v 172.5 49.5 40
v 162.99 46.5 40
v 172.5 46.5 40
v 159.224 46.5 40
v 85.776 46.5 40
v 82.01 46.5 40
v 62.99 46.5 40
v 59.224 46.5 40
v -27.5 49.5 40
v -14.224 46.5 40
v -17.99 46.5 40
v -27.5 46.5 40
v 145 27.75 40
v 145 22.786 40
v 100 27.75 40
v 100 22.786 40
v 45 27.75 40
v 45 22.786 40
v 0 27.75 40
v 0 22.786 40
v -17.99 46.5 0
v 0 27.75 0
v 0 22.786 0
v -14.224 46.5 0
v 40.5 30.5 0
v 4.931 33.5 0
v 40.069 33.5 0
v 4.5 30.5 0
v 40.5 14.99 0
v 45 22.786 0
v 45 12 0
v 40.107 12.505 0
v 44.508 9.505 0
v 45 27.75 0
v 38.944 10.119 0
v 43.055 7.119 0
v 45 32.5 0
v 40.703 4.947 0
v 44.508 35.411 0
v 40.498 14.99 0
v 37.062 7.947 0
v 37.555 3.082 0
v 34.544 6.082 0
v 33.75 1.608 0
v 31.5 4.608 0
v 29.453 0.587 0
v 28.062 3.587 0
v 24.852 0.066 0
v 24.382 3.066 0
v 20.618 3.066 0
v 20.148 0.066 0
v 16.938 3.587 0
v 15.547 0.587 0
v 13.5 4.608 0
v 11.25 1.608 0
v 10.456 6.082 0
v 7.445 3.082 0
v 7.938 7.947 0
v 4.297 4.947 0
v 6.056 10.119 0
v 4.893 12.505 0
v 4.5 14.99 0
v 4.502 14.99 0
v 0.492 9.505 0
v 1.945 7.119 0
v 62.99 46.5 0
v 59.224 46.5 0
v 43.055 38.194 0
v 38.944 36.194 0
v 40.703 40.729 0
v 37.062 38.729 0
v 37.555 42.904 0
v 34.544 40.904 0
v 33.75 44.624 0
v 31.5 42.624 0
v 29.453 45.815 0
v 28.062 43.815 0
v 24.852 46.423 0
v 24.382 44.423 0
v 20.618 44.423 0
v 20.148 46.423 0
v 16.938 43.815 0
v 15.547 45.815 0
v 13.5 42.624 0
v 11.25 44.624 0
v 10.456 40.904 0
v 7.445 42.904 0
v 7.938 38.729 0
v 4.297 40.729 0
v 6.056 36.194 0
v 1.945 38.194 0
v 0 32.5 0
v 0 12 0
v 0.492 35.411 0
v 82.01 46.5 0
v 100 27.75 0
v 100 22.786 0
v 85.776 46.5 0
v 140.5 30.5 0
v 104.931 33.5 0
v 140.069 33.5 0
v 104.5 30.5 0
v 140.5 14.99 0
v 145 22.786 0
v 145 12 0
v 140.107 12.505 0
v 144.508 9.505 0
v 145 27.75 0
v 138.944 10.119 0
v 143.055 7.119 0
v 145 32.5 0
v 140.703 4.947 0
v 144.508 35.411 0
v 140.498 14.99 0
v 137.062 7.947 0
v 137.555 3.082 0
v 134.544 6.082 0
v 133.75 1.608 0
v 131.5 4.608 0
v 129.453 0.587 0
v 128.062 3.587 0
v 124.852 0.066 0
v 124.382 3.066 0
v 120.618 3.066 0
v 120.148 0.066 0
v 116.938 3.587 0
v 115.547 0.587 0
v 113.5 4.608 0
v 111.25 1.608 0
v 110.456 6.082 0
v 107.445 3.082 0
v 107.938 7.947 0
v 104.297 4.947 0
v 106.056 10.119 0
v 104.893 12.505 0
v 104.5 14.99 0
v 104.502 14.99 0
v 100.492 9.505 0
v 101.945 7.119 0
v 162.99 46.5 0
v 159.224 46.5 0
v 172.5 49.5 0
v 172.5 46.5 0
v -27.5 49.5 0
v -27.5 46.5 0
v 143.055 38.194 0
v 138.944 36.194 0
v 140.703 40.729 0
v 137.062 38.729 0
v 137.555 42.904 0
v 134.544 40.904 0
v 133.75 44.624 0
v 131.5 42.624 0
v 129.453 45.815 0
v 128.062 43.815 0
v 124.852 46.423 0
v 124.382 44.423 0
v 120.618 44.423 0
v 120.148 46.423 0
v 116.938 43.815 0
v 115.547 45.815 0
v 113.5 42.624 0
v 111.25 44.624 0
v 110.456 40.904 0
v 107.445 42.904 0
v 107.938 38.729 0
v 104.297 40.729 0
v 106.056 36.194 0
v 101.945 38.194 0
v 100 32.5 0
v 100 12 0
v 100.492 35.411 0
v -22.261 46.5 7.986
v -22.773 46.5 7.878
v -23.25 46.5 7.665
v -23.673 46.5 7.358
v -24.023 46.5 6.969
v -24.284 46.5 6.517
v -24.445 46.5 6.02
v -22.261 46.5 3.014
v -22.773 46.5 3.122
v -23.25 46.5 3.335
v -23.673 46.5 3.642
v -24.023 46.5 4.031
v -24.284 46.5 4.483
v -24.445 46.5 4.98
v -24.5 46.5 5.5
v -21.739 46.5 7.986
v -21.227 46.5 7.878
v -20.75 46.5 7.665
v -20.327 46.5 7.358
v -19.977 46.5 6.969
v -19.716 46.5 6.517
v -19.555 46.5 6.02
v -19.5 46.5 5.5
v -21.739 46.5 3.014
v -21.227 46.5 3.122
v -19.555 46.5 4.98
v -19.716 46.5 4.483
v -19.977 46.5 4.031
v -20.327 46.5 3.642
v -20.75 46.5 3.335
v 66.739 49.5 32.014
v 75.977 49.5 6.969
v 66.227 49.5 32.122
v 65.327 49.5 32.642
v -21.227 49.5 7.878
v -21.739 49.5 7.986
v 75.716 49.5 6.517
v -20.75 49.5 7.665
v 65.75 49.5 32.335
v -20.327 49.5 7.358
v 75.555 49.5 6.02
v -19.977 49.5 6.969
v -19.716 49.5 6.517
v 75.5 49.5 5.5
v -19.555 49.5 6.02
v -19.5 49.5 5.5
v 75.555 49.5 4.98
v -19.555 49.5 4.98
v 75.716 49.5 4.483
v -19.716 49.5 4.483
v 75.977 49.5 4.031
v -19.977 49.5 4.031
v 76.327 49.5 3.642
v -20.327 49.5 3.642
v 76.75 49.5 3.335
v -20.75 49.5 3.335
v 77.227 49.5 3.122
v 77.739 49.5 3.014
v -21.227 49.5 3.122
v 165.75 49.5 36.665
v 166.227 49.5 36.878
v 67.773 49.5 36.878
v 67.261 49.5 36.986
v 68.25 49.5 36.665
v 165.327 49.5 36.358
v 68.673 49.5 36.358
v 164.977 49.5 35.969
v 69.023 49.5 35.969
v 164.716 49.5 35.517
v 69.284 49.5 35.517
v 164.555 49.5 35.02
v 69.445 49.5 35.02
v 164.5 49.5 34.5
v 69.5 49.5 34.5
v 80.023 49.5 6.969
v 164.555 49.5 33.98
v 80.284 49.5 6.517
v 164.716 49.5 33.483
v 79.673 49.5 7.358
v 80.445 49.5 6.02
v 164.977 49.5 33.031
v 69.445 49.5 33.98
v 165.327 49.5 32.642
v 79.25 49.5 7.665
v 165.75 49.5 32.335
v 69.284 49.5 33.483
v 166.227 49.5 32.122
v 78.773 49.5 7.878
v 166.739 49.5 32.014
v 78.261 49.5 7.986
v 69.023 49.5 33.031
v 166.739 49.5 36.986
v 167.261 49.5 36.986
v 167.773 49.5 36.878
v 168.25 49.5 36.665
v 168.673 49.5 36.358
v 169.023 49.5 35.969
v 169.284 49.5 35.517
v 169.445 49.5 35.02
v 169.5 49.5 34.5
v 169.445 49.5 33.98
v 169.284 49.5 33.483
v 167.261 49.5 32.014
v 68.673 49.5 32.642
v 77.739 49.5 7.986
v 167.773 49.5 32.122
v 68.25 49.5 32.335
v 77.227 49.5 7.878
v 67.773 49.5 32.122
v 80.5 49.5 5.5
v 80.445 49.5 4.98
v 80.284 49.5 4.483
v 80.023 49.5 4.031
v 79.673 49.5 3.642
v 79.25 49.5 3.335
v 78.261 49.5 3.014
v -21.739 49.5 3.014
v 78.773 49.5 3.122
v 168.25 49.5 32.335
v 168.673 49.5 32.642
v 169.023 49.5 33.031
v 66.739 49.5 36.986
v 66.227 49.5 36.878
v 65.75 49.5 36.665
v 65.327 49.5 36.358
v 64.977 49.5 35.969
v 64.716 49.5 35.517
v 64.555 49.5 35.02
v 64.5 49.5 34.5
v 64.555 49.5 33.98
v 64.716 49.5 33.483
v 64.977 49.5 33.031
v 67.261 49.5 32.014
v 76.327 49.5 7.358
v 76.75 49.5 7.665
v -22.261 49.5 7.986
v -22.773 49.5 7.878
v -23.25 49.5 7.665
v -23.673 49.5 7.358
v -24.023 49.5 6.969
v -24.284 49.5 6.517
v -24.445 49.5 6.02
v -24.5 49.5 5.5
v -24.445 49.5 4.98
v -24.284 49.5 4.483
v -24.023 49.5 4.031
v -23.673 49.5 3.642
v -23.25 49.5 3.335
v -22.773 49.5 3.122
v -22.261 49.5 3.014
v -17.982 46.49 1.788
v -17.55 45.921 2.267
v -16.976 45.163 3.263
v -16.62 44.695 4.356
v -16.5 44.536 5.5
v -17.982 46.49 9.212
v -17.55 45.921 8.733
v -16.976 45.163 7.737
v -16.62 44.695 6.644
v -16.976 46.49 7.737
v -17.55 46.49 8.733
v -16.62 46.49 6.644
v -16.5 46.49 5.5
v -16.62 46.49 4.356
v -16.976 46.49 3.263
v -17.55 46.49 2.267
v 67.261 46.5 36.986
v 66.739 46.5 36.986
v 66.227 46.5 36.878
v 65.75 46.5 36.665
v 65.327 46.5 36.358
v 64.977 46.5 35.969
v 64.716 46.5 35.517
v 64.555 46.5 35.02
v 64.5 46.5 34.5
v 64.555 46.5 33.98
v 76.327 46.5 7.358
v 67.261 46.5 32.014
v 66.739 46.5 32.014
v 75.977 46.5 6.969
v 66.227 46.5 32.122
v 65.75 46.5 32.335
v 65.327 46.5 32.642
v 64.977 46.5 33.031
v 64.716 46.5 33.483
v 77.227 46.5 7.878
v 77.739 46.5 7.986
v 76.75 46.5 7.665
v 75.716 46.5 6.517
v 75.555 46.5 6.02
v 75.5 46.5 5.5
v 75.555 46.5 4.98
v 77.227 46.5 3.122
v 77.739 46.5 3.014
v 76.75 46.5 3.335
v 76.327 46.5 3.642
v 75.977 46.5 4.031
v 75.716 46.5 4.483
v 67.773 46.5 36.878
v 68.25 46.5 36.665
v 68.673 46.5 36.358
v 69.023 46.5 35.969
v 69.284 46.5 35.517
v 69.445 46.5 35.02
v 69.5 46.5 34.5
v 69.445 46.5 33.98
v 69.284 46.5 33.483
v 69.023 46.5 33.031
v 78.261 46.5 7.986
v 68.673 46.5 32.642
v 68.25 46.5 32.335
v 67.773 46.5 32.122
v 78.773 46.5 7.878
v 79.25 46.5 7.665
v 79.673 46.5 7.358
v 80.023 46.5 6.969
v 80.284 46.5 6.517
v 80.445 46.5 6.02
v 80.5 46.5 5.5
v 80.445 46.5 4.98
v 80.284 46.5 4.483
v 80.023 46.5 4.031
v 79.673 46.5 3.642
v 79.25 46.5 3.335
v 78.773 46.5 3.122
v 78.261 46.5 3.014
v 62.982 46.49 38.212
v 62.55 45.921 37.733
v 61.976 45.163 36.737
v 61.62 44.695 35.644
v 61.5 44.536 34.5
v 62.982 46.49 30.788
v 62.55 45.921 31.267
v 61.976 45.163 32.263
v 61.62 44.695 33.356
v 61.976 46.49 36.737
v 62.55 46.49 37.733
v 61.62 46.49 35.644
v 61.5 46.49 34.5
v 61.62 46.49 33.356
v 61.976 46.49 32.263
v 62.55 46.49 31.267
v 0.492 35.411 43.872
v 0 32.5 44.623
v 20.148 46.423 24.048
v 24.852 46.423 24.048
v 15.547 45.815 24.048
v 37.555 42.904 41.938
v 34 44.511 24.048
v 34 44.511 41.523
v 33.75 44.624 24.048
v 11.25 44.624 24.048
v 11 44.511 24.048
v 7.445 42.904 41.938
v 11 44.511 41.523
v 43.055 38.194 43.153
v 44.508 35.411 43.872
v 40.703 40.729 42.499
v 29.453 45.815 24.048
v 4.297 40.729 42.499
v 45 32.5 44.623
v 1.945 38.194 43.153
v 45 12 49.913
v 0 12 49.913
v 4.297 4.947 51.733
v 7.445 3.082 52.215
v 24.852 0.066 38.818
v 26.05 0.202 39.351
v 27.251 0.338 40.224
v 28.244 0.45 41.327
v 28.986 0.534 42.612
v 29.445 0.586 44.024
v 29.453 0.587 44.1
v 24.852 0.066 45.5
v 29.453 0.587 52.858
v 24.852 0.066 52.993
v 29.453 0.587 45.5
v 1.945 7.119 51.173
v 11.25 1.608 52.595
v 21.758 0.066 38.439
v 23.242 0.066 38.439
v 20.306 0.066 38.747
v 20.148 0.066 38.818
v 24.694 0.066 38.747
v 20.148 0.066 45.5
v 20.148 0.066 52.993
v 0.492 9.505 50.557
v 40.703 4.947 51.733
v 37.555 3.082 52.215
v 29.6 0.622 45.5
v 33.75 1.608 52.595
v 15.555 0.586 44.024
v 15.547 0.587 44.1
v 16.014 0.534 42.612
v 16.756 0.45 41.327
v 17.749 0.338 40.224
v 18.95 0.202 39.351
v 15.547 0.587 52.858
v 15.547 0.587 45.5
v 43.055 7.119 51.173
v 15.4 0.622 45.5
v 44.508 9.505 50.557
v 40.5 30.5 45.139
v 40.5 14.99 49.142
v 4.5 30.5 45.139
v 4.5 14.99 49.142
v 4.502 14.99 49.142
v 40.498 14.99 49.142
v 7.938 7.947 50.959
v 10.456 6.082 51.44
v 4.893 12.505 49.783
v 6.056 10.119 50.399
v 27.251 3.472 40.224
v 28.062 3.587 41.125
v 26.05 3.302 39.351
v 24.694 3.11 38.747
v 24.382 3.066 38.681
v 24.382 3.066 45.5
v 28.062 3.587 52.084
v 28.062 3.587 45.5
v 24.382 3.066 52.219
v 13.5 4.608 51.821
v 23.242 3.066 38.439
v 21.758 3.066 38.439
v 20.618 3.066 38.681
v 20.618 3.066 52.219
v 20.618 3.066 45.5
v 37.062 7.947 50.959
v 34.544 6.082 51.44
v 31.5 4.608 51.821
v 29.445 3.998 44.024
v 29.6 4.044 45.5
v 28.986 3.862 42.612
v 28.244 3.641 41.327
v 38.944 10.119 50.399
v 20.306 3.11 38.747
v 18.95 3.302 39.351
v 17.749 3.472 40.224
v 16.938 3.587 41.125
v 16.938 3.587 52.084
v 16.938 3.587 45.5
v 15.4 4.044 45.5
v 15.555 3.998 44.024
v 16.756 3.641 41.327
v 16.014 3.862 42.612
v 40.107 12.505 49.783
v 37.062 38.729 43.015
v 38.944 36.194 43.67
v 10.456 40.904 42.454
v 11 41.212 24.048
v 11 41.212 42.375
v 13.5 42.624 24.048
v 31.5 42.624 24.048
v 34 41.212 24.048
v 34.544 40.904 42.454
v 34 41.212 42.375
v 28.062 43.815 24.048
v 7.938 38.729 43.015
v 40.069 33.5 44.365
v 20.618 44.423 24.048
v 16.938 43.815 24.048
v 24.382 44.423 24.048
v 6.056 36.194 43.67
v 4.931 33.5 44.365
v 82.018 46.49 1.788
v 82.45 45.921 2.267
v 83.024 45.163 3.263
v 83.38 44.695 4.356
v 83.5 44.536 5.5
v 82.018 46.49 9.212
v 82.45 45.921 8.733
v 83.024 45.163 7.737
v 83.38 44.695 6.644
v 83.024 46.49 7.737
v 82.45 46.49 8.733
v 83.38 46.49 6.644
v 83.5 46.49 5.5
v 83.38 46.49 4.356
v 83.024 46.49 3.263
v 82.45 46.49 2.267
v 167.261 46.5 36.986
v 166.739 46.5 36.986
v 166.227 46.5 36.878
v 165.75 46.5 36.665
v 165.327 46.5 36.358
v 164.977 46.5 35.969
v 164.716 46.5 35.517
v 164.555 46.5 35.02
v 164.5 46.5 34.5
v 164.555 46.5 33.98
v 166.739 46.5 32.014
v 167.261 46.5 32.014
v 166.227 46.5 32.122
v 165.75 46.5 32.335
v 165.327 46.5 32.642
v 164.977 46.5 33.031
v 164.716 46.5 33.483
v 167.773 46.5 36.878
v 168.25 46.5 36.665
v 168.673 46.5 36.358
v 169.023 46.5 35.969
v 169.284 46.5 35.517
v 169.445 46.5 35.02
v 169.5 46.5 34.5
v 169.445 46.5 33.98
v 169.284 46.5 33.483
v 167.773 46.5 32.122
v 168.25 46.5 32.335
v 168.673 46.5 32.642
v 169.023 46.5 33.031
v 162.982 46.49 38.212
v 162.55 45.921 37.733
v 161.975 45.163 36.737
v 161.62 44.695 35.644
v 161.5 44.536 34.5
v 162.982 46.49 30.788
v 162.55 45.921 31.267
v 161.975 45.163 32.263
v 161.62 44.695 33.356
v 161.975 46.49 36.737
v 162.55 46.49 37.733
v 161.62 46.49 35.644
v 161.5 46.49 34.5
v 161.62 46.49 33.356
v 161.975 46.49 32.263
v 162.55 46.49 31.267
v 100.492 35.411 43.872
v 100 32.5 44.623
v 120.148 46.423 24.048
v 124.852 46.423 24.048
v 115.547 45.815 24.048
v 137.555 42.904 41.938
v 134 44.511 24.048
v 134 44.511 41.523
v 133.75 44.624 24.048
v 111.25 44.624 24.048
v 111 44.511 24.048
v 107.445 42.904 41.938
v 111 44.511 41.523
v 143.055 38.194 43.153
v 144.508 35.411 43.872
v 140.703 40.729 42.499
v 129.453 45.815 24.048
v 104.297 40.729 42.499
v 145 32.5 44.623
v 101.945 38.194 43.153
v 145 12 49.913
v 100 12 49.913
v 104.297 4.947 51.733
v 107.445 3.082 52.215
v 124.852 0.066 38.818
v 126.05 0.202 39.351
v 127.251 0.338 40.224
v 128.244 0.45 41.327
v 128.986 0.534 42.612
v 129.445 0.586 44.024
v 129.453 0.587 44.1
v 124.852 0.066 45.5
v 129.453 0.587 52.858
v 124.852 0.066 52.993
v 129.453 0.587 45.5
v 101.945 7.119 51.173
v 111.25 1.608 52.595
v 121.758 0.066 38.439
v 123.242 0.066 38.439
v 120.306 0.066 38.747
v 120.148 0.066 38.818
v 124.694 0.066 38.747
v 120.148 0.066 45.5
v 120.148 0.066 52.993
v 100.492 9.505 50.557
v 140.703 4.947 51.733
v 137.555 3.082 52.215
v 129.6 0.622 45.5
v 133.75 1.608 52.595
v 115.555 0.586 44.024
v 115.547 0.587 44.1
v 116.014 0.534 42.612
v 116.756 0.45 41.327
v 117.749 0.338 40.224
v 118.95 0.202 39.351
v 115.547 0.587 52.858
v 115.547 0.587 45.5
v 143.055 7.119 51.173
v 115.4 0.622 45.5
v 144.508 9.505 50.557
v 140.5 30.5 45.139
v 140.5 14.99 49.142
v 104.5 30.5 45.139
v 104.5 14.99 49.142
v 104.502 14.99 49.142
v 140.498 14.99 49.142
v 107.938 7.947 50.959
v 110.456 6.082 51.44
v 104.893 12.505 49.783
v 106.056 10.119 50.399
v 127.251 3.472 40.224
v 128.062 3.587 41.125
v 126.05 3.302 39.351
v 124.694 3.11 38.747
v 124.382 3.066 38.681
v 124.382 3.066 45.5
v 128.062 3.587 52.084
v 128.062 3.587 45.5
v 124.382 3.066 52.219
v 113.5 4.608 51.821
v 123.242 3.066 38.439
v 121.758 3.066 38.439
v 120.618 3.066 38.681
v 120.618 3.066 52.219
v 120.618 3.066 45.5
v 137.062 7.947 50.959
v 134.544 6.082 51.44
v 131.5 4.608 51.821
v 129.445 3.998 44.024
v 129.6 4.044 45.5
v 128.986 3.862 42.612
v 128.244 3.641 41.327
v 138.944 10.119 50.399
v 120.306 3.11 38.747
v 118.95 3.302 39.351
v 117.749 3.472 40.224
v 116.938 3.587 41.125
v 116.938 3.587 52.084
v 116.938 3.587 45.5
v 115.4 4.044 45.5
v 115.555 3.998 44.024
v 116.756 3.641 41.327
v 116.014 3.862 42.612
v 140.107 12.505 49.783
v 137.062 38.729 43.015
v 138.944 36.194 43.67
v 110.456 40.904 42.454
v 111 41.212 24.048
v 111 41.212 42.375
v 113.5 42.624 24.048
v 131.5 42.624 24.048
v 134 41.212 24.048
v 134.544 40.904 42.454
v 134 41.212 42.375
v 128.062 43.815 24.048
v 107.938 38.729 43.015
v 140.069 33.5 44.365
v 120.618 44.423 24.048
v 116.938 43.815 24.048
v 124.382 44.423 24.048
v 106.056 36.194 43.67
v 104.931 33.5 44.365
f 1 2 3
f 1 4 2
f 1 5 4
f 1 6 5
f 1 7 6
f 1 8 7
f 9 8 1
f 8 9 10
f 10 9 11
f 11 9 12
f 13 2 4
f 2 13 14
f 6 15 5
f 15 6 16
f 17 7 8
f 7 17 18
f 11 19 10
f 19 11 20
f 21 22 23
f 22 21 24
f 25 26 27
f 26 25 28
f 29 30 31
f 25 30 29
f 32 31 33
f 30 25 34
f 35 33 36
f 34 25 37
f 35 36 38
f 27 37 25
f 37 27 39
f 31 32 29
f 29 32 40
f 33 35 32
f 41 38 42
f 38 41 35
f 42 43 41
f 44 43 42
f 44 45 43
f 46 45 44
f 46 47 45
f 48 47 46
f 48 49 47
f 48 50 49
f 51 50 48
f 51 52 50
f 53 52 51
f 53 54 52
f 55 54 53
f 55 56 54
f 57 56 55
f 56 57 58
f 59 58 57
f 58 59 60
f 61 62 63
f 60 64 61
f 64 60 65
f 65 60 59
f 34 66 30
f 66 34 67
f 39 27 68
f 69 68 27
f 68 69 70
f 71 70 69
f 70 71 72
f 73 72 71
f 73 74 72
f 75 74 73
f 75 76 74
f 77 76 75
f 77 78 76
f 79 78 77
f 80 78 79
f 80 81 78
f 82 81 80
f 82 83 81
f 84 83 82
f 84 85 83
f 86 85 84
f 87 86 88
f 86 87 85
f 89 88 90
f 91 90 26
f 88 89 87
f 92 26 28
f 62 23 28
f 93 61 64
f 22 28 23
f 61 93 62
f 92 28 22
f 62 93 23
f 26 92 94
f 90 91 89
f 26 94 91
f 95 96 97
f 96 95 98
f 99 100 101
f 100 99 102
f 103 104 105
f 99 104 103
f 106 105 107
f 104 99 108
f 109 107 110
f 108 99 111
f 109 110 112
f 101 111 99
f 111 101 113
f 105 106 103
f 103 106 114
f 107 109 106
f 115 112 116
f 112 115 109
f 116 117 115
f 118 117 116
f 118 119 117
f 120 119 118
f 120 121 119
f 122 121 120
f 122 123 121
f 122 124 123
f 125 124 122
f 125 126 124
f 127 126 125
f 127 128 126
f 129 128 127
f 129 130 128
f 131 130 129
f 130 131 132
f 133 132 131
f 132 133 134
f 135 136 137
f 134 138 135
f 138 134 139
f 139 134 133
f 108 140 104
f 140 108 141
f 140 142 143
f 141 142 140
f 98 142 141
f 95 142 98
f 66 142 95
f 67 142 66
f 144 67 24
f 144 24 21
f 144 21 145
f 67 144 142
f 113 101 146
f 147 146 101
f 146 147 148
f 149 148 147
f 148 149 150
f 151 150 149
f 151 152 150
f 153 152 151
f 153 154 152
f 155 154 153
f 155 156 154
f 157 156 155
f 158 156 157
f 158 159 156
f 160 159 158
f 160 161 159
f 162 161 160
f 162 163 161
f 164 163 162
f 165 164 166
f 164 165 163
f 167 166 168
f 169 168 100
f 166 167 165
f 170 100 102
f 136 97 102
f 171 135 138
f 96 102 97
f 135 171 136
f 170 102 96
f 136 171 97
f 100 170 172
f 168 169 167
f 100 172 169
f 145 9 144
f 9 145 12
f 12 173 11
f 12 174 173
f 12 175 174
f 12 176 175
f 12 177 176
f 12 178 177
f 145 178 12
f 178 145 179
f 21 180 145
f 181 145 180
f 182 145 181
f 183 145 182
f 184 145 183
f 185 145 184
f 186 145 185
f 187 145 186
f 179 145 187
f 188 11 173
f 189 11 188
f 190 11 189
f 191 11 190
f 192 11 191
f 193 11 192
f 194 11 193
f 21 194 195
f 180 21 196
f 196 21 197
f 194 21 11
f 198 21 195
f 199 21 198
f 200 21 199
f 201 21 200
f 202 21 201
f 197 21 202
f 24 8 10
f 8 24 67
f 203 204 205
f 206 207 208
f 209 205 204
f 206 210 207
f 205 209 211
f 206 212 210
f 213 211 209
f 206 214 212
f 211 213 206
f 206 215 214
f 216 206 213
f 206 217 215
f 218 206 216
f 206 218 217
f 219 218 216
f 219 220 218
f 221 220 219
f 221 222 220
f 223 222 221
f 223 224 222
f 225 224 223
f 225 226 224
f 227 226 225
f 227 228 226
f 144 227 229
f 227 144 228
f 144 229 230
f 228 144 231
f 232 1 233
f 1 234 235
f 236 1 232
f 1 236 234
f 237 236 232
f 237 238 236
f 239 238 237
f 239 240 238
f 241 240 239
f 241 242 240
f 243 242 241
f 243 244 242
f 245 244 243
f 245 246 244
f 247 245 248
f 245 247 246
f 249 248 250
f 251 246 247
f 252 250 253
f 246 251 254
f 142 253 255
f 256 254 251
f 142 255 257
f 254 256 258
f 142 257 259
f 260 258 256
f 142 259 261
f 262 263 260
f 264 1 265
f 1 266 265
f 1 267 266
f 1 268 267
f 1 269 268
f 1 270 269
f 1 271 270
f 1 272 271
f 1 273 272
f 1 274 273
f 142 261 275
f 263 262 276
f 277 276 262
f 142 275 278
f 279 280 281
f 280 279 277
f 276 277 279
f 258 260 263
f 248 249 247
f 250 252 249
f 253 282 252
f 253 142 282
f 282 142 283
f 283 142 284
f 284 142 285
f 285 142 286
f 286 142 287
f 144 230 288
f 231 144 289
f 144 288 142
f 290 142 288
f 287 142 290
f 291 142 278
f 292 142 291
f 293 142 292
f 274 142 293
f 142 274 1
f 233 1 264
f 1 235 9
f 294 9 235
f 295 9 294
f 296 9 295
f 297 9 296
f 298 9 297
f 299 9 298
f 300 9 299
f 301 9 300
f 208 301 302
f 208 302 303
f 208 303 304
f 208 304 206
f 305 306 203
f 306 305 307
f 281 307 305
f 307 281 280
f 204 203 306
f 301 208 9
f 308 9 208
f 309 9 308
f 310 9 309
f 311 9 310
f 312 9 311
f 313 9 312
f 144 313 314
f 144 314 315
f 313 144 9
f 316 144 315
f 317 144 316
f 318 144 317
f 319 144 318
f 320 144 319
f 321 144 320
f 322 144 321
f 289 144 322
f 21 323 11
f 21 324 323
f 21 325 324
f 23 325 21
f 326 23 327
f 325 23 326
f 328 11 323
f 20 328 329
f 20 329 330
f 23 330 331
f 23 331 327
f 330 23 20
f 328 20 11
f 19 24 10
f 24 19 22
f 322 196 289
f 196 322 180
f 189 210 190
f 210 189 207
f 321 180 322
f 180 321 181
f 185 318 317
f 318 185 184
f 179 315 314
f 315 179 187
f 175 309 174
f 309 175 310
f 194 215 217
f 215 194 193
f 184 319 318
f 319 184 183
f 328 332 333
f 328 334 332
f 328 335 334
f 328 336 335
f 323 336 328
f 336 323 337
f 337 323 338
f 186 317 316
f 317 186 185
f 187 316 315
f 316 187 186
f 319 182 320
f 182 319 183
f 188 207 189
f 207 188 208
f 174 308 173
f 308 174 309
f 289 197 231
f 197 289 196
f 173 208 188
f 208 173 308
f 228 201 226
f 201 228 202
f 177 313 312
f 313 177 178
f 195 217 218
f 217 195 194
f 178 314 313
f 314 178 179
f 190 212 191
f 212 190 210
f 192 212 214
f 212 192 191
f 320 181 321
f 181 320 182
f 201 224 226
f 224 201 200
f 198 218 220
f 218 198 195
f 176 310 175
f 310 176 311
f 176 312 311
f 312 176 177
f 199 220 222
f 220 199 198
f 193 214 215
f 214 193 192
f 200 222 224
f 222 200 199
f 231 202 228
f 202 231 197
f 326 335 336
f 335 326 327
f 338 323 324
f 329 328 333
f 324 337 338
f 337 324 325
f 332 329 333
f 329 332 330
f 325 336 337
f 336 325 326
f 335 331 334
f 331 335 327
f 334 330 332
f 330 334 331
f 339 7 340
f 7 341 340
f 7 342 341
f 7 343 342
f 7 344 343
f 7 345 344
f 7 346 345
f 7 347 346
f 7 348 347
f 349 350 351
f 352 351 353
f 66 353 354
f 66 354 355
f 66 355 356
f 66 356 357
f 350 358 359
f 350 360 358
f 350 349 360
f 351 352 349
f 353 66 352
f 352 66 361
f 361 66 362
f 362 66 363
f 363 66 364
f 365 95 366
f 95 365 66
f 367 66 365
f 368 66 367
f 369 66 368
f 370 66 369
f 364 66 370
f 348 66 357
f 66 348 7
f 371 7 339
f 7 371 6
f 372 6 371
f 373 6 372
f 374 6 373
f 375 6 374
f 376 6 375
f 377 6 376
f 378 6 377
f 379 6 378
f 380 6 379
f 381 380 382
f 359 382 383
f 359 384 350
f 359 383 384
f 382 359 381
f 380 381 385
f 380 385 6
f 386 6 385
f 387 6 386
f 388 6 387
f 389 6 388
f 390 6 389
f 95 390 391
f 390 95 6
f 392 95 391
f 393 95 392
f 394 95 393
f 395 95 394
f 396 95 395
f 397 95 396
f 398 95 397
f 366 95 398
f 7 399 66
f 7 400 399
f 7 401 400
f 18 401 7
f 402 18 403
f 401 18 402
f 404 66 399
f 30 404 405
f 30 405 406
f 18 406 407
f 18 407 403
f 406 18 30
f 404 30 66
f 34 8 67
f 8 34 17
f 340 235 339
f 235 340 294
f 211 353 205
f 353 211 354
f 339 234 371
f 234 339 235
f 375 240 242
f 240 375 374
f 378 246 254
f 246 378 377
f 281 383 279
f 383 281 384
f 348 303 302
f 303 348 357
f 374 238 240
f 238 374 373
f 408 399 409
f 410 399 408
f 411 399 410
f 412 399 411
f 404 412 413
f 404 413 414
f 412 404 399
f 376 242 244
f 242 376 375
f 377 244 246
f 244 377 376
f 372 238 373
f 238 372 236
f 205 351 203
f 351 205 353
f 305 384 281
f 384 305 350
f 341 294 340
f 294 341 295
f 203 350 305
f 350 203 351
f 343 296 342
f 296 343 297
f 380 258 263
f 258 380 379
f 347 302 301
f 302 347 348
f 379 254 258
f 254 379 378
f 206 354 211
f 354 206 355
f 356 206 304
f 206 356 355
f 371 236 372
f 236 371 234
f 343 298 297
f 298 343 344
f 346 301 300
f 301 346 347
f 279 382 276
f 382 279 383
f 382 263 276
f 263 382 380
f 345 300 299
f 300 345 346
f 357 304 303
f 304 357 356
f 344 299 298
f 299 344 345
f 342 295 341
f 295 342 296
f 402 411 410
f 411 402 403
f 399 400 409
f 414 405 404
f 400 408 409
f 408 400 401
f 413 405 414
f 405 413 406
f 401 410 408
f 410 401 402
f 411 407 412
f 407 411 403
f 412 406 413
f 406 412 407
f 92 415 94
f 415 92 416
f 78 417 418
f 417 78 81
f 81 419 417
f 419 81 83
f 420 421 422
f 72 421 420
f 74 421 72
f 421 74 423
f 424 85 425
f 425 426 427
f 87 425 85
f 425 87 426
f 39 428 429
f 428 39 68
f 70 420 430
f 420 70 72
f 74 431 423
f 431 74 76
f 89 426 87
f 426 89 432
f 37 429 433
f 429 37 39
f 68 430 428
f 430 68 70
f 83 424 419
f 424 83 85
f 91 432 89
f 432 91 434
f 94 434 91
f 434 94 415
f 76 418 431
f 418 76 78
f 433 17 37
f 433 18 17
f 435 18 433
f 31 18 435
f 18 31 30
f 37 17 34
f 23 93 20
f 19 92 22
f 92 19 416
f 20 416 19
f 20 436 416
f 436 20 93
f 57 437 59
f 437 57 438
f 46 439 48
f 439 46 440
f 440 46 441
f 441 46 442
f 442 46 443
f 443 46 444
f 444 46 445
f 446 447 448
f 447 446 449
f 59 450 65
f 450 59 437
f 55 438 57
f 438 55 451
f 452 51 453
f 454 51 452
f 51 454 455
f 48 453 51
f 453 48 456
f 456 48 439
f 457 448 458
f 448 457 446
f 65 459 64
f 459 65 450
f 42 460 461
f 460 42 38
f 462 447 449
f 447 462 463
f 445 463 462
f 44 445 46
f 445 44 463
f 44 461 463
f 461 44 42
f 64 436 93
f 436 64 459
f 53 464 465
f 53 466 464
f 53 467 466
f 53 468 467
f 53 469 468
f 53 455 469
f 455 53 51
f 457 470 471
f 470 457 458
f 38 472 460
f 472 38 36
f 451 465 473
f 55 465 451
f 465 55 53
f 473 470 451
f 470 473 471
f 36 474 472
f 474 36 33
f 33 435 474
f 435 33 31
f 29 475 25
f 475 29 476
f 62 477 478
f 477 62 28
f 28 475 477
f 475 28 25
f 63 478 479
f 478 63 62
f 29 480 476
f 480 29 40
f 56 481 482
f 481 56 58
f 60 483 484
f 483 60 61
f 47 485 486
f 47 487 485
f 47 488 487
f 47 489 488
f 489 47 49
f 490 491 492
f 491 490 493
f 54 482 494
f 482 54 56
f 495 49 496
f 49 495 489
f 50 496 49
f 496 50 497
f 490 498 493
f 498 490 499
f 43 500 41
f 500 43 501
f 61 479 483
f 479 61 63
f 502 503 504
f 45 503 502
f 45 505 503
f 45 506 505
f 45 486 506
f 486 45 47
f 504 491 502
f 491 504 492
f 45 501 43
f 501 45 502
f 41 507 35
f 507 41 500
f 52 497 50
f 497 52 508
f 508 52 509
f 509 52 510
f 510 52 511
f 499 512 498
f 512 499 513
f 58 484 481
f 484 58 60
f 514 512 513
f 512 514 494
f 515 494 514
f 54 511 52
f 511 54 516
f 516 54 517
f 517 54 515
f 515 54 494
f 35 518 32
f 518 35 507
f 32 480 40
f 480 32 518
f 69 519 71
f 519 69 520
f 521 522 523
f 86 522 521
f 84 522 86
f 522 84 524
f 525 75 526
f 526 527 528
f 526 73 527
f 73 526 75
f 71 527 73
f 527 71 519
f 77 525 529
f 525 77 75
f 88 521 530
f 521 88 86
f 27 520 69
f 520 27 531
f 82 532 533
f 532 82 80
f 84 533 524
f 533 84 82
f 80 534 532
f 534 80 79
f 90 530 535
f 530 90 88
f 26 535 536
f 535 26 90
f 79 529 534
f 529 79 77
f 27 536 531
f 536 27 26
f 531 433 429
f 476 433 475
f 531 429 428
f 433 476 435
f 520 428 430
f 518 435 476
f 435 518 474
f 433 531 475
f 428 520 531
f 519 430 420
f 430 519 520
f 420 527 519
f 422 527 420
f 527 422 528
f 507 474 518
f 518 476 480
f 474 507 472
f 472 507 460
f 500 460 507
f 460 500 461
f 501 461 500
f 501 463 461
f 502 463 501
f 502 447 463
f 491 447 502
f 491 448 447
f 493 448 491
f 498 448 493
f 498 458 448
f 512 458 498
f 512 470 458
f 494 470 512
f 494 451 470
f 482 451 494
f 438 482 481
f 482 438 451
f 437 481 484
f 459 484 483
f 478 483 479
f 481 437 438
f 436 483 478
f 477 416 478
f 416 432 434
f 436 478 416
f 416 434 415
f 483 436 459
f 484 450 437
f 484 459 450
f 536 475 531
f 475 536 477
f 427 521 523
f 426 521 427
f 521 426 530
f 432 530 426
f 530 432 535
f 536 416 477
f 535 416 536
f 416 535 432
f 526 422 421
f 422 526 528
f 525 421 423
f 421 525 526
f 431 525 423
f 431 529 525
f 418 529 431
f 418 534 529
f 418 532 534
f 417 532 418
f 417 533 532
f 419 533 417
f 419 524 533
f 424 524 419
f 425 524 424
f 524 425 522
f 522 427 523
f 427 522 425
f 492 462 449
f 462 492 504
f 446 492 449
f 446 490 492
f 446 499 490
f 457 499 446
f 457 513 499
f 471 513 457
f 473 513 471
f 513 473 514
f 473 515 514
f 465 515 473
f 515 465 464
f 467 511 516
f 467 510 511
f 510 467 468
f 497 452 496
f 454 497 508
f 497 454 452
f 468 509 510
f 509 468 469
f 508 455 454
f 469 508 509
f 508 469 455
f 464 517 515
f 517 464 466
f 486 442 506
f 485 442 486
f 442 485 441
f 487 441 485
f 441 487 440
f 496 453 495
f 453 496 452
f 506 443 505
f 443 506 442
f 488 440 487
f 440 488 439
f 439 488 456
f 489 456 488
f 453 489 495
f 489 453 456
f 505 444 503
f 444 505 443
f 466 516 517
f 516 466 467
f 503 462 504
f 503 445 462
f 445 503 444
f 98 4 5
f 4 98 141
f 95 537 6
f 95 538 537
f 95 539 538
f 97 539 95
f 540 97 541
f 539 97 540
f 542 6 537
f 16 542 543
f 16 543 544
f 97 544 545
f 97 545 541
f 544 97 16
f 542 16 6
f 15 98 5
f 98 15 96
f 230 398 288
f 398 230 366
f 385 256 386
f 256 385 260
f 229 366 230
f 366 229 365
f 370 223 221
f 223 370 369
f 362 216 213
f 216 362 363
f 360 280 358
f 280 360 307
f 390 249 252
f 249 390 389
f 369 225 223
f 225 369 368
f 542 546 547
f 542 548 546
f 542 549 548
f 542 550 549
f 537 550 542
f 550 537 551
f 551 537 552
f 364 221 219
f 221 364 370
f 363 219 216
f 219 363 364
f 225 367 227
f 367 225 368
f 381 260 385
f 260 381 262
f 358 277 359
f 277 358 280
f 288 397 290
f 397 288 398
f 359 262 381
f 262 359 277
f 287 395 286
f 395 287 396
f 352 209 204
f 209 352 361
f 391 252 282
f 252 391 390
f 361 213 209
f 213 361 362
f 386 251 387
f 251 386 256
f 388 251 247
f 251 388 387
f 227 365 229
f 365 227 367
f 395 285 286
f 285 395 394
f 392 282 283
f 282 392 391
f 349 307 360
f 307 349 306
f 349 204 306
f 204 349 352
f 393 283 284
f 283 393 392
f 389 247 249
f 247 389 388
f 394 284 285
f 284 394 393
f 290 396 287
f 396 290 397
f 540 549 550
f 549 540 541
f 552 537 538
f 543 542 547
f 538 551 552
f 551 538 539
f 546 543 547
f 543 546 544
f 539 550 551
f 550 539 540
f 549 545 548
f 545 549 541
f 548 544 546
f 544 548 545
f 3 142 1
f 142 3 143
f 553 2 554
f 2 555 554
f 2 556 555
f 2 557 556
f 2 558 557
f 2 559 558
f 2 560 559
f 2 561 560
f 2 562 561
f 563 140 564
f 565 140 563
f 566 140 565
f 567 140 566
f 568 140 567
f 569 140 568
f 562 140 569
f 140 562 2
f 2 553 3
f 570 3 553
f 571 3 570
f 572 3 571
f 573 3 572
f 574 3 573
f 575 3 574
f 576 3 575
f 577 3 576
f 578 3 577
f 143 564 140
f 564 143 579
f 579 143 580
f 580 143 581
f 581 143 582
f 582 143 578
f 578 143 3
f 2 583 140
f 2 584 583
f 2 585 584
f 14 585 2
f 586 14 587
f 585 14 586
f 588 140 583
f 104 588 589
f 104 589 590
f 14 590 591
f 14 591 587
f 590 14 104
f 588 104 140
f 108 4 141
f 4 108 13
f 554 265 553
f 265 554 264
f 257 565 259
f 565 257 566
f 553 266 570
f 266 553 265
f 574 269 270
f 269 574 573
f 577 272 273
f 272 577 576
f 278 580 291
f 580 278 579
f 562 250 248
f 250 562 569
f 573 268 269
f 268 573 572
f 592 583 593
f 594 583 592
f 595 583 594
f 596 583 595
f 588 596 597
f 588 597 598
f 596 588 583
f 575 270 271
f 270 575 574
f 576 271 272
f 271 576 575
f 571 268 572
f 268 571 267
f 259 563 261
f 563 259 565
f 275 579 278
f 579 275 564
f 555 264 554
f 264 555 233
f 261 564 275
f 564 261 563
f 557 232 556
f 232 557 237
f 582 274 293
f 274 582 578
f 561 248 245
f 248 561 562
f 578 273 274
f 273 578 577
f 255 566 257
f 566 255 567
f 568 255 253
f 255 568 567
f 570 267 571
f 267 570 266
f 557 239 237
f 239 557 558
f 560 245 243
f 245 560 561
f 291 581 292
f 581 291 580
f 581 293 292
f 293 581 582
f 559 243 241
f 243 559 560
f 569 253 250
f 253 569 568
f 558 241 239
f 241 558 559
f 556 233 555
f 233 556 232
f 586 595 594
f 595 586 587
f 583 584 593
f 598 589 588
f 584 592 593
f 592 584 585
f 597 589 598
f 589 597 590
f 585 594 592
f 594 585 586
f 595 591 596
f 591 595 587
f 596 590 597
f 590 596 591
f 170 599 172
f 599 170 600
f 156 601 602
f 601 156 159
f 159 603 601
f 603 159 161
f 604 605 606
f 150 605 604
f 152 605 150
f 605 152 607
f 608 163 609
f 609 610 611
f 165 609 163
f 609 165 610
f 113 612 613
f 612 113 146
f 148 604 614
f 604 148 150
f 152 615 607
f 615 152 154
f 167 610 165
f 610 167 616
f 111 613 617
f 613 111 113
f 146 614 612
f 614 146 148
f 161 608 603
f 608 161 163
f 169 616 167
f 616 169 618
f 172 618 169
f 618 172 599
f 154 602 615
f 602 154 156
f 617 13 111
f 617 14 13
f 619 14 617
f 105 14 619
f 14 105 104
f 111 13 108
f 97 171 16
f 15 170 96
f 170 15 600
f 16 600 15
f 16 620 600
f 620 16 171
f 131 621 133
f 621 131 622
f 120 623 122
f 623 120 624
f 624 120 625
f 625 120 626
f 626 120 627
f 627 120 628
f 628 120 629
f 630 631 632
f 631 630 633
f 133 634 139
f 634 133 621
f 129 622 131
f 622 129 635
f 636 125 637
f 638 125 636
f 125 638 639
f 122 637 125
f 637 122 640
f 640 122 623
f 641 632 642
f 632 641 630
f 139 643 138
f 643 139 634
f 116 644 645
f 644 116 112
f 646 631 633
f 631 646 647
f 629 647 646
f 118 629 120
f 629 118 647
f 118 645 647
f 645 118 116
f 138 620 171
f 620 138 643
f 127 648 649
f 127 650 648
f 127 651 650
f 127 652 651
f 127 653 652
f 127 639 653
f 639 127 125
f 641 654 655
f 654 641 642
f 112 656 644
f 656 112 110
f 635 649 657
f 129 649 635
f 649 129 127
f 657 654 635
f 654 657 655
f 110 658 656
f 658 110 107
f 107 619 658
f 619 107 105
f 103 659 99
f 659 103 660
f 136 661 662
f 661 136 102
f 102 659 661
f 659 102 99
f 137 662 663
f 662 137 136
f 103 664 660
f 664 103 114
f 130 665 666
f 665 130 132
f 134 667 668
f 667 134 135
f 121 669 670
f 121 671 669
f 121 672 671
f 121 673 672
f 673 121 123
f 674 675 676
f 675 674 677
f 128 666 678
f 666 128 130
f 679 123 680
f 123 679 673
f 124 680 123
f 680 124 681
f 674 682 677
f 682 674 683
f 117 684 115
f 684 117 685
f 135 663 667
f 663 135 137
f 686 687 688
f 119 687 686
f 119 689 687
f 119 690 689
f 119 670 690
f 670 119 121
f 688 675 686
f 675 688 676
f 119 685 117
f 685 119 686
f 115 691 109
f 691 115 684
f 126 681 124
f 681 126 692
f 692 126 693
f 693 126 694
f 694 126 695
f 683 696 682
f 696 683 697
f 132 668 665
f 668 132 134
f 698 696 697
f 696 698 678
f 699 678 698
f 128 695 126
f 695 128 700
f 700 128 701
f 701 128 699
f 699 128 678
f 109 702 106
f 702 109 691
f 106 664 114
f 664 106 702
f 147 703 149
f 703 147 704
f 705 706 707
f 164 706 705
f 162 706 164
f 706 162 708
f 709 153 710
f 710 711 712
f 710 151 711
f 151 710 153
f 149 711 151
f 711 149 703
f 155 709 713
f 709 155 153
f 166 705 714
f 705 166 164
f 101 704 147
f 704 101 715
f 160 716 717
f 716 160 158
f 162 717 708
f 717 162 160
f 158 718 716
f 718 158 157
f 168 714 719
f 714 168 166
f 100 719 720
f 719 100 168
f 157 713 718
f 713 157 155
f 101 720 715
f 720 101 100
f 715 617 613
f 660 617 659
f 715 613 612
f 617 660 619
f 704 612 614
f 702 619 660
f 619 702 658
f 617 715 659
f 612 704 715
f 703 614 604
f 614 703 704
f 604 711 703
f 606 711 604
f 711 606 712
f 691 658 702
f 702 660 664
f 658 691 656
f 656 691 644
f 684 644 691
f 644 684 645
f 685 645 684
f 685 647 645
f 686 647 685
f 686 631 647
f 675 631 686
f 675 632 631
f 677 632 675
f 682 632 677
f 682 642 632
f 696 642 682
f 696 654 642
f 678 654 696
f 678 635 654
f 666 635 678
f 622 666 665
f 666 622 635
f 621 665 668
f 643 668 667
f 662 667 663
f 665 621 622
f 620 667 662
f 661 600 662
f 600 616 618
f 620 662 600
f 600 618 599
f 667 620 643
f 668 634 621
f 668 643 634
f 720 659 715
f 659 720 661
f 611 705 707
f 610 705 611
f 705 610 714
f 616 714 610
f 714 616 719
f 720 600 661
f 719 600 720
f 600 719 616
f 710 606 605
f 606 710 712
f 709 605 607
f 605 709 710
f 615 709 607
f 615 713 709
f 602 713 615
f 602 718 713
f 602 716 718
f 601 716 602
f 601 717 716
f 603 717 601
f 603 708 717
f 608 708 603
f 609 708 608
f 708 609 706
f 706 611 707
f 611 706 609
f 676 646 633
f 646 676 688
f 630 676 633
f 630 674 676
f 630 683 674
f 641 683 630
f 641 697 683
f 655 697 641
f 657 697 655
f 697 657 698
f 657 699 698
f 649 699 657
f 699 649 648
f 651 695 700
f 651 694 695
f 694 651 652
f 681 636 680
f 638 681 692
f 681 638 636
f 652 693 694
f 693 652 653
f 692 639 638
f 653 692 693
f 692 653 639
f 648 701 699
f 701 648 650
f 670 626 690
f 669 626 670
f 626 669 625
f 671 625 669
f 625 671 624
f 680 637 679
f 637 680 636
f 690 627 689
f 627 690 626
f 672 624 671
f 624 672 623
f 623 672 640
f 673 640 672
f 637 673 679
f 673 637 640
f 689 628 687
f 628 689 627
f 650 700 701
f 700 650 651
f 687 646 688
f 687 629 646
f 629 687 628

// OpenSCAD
// The number of accessory holders to produce
numAccessoryHolders = 2; // [1:10]

// The depth of the cavity which contains the accessory. 53mm is just enough to fully contain the nozzle on my accessories.
holderDepth = 53; // [15:60]

// The center-to-center distance between accessory holders, in mm. 135mm is about right for a floor roller.
accessoryHolderSpacing = 100; //[75:200]

// The height of the structure between the accessory holders
wallPlateHeight = 40; // [10:53]

// The size of the screw holes, in mm. Be sure to include necessary clearance. 5mm corresponds to roughly a #10 SAE screw. Set to zero for no screw holes.
screwHoleDiameter = 5; // [0:10]

// Screw head size, in mm. Set this to the size of the screws you plan to use for mounting. Zero for no screw head clearance.
screwHeadDiameter = 11; // [0:50]

/* [Hidden] */

// Measured Constants. May be useful to change these to make accessory holders for slightly-different vacuums.
// I am defining the nozzle as the part of the accessory which goes into the vacuum, and the shell as the part of the accessory which is outside of the vacuum (the clip is on the shell).
// All units in millimeters.

// The longer measurement of the accessory nozzle, perpendicular to the acuation direction of the clip.
nozzleLongDimension = 36.0;

// The shorter measurement of the accessory nozzle, parallel to the actuation direction of the clip.
nozzleShortDimension = 27.5;

// The measurement of the shell in the same axis as the nozzleLongDimension.
shellOutsideLongDimension = 45.0;

// The measurement of the shell in the same axis as the nozzleShortDimension.
shellOutsideShortDimension = 46.5;

// The size of the "clippy" part of the clip, same axis as nozzleLongDimension.
clipInnerWidth = 14.2;

// The height of the "clippy" part of the clip, parallel to the long axis of the accessory.
clipInnerHeight = 5.0;

// The clearance needed for the clip to swing. Same axis as the nozzleShortDimension.
clipThickness = 9.0;

// The height of the clip from the shell. There should be a cutout starting here.
clipHeight = 7.5;

// The distance between the nozzle and the outer shell, measured at the point of the clip. The clip would clip in here.
nozzleShellClipDistance = 3;

// The distance between the nozzle and the outer shell, measured on the opposite size from the clip.
nozzleShellRearDistance = 17.0;

// The shell runs at an angle, with the lowest part at the clip and the highest part opposite the clip. This is the change in height between the shell at the clip, and the shell at opposite side.
shellRearHeightLoss = 12.0;

// The rear shell footprint is roughly an oval with the long diameter of shellOutsideLongDimension and the short radius of this value.
// Controls the round-ness of the rear of the accessory holder.
shellRearShortRadius = 14.0;

// The front shell footprint is roughly an oval with the long diameter of shellOutsideLongDimension and the short radius of this value.
// Controls the round-ness of the front of the accessory holder.
shellFrontShortRadius = 12.0;

// Some accessories, like the floor rollers, have a plug to carry power from the vacuum to the acessory. Make space for that.
powerPlugLength = 23.0;
powerPlugWidth = 10.0;
powerPlugHeight = 18.5;

// Constants

// Epsilon, used as a fudge factor when making floating point comparisons, such as in union and difference functions.
eps = 0.01;

// Whenever we produce a shell which just needs to look pretty, it should be this thick.
cosmeticShellThickness = 2.0;

// Whenever we produce a shell which actually needs to do something, it should be this thick.
structuralShellThickness = 3.0;

// Make a partial circle of the given height. Scale the result to fit your needs.
// @param a: Angle in degrees
// @param r: Cylinder radius
// @param h: Cylinder height
// @return A semi-cylinder of height h and radius r
module cylinderSlice(r, h, a){
  scale([r, r, h])
  scale([1/100, 1/100, 1]) // Make the original radius 100, then scale back to 1, to get a reasonable number of faces since scad represents circles as polygons.
  rotate_extrude(angle=a) square([100,1]);
}

// Make a single accessory holder
module makeAccessoryHolder() {
    // Create the main body of the accessory holder
    difference() {
         // Outer shell
        union() {
          // Rear rounding
          translate([
            shellOutsideLongDimension / 2,
            shellOutsideShortDimension - shellRearShortRadius,
            0
          ])
          scale([shellOutsideLongDimension / 2, shellRearShortRadius, holderDepth])
          cylinderSlice(r=1, h=1, a=180);
          // Squared middle
          translate([0, shellFrontShortRadius, 0])
          cube([shellOutsideLongDimension, shellOutsideShortDimension - shellRearShortRadius - shellFrontShortRadius, holderDepth]);
          // Front rounding
          translate([shellOutsideLongDimension / 2, shellFrontShortRadius, 0])
          rotate(180, [0, 0, 1])
          scale([shellOutsideLongDimension / 2, shellFrontShortRadius, holderDepth])
          cylinderSlice(r=1, h=1, a=180);
        }

        // Cutout for the accessory nozzle
        translate([
          (shellOutsideLongDimension - nozzleLongDimension)/2, nozzleShellClipDistance, -eps
        ])
        union() {
          translate([0, shellFrontShortRadius - eps, 0])
          cube([nozzleLongDimension, nozzleShortDimension- shellFrontShortRadius + eps, holderDepth + 2*eps]);
          translate([
            nozzleLongDimension / 2,
            shellFrontShortRadius,
            -eps
          ])
          rotate(180, [0, 0, 1])
          scale([nozzleLongDimension / 2, shellFrontShortRadius, holderDepth + 2*eps])
          cylinderSlice(r=1, h=1, a=180);
        }

        // Cut off the top at an angle
        // Use an absurdly tall cube, rotated to the appropriate angle, to make this cut.
        cutAngle = atan(shellRearHeightLoss/shellOutsideShortDimension);
        translate([
          -eps,
          0,
          holderDepth + eps
        ])
        rotate(-1 * cutAngle, [1, 0, 0])
        cube([
          shellOutsideLongDimension * 2,
          shellOutsideShortDimension * 2,
          holderDepth * 2
        ]);

        // Cutout the back area, so as not to waste materials when printing
        translate([
          (shellOutsideLongDimension - nozzleLongDimension)/2,
          nozzleShellClipDistance + nozzleShortDimension + structuralShellThickness,
          -eps
        ])
        difference() {
          // Trim the part which will be used to make the cutout, to make sure the structural shell part is not removed
          union() {
            // Join a semi-cylinder with a cube to make the cutout
            wasteSize = shellOutsideShortDimension - nozzleShellClipDistance - nozzleShortDimension - cosmeticShellThickness - structuralShellThickness;
            translate([
              nozzleLongDimension / 2,
              wasteSize - shellRearShortRadius,
              0
            ])
            scale([nozzleLongDimension / 2, shellRearShortRadius, 1])
            cylinderSlice(r=1, h=holderDepth + 2*eps, a=180);

            cube([
              nozzleLongDimension,
              wasteSize - shellRearShortRadius + eps,
              holderDepth + 2*eps
            ]);
          }

          translate([0, -structuralShellThickness, 0])
          cube([nozzleLongDimension, structuralShellThickness, holderDepth]);
        }

        // Cutout for the power plug
        translate([
          shellOutsideLongDimension/2 - powerPlugLength / 2,
          shellOutsideShortDimension - powerPlugWidth + eps,
          holderDepth - shellRearHeightLoss - powerPlugHeight + structuralShellThickness * 2 * tan(cutAngle)
        ])
        cube([powerPlugLength, powerPlugWidth, powerPlugHeight]);

        // Cutout for the clip
        translate([
          (shellOutsideLongDimension)/2,
          nozzleShellClipDistance + shellFrontShortRadius + 2*eps,
          holderDepth - clipHeight
        ])
        rotate([90, 180, 0])
        difference() {
          cylinderSlice(r=clipInnerWidth/2, h=nozzleShellClipDistance + shellFrontShortRadius + 2*eps, a=180);
        }
    }
}

module makeWallPlate() {
  difference() {
    union() {
      wallPlateSize = accessoryHolderSpacing/2;
      // The main, back part of the wall plate
      cube([wallPlateSize + eps, structuralShellThickness, wallPlateHeight]);

      // Pick the angle such that the brace will meet the center of the accessory holder and leave enough space for a screw.
      wallDistanceToBrace = wallPlateSize - (shellOutsideLongDimension / 2) - screwHeadDiameter;
      heightFromWallToBrace = (shellOutsideShortDimension - structuralShellThickness) / 2;
      wallBraceAngle = atan(heightFromWallToBrace / wallDistanceToBrace);

      wallBraceLength = heightFromWallToBrace / sin(wallBraceAngle) + structuralShellThickness / cos(wallBraceAngle);

      // The structural angle brace of the wall plate
      translate([screwHeadDiameter, 0, 0])
      rotate(wallBraceAngle, [0, 0, 1])
      cube([wallBraceLength + eps, structuralShellThickness, wallPlateHeight]);
    }

    // Screw hole
    translate([screwHeadDiameter / 2, -eps, screwHeadDiameter/2])
    rotate(-90, [1, 0, 0])
    union() {
      // The screw shaft. Only as thick as the structure, since that's what it's supposed to be going through.
      cylinderSlice(r = screwHoleDiameter/2, h = structuralShellThickness + 2*eps, a=360);
    translate([0, 0, structuralShellThickness + 2*eps])
      // The screw head - Make it really tall so it will cut through the braces if the distance between accessories is really small.
      cylinderSlice(r = screwHeadDiameter/2, h = shellOutsideShortDimension, a=360);
    }
  }
}

module makePart() {
  for (i = [0:numAccessoryHolders - 1]) {
    // Place the wall plate
    for (wallPlateIdx = [0:1]) {
      translate([i*accessoryHolderSpacing, shellOutsideShortDimension+structuralShellThickness, 0]) // Move the accessory plate to the appropriate wall mount
      translate([(1 * wallPlateIdx - 1)*accessoryHolderSpacing / 4, 0, 0]) // Move the accessory plate to the correct location
      translate([(1 * wallPlateIdx - 1) * accessoryHolderSpacing / 4 + shellOutsideLongDimension / 2, 0, 0]) // Center the wall plate on the accessory mount
      // Correct the second half for having been rotated over the X axis
      translate([(1*wallPlateIdx)*accessoryHolderSpacing/2, 0, (1*wallPlateIdx) * wallPlateHeight])
      mirror([(1*wallPlateIdx), 0, 0]) // Mirror the second mount half
      mirror([0, 0, (1*wallPlateIdx)])
      mirror([0, 1, 0])
      makeWallPlate();
    }

    // Place an accessory holder
    translate([i*(accessoryHolderSpacing), 0, 0])
    makeAccessoryHolder();
  }
}

makePart();
